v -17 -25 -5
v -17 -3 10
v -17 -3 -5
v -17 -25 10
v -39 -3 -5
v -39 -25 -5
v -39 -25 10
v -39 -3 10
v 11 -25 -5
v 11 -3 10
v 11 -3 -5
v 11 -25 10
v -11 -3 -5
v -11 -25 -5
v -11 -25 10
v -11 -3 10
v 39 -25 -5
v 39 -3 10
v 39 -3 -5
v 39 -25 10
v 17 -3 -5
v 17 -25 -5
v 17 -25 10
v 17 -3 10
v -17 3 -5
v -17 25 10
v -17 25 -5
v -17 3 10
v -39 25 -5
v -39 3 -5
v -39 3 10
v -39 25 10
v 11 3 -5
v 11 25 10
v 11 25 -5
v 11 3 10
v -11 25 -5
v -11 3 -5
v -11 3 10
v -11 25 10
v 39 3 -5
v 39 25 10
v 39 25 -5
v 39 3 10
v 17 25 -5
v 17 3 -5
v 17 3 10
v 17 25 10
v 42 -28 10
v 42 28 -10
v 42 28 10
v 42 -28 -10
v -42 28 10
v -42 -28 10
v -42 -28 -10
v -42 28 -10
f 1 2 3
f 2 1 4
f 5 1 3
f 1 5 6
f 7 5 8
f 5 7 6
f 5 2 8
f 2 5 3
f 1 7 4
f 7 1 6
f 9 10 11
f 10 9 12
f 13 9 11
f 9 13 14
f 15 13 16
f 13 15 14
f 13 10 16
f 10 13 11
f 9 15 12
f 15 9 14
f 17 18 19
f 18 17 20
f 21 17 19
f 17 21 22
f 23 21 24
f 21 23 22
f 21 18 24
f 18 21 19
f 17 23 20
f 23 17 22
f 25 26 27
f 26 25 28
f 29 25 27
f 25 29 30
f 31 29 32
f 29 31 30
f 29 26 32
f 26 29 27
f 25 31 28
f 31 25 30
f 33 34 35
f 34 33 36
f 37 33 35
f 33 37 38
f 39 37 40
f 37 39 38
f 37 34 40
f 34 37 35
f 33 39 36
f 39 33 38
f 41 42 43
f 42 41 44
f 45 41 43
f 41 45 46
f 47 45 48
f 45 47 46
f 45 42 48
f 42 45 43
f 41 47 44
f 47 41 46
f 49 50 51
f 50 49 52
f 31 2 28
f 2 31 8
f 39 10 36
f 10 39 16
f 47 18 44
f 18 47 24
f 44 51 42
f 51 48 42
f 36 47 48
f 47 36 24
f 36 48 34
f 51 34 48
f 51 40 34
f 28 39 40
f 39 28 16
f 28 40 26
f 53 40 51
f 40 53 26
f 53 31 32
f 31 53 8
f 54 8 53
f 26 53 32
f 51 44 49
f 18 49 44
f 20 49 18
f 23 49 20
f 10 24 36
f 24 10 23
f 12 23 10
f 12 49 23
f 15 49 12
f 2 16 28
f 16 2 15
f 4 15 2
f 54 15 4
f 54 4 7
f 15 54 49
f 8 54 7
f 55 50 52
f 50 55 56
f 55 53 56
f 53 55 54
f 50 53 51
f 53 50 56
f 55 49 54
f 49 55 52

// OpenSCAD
$fn = 32;

// ----------------------------------------------------------------------
// Pocket plate 84 x 56 x 20
// 2 x 3 pockets 22 mm square, 15 mm deep
// ----------------------------------------------------------------------

// --- parameters (mm) ---
thickness = 20;  // plate thickness
floor_t = 5;     // material left under each pocket
pocket = 22;     // pocket side length
pitch_x = 28;    // pocket pitch along X
pitch_y = 28;    // pocket pitch along Y
cols = 3;        // pockets per row
rows = 2;        // rows of pockets

// --- derived feature positions (mm) ---
depth = thickness - floor_t;        // = 15   pocket depth, down to the floor
span_x = (cols - 1) * pitch_x;      // = 56   distance between outer pockets
span_y = (rows - 1) * pitch_y;      // = 28   distance between outer pocket rows
origin_x = -span_x / 2;             // = -28   X of the first pocket
origin_y = -span_y / 2;             // = -14   Y of the first pocket
plate = [span_x + pocket + 6, span_y + pocket + 6, thickness];  // = [84, 56, 20]   overall size: pockets plus 3 mm of wall on each side
feature_centers = [
  [origin_x + 0 * pitch_x, origin_y + 0 * pitch_y],
  [origin_x + 1 * pitch_x, origin_y + 0 * pitch_y],
  [origin_x + 2 * pitch_x, origin_y + 0 * pitch_y],
  [origin_x + 0 * pitch_x, origin_y + 1 * pitch_y],
  [origin_x + 1 * pitch_x, origin_y + 1 * pitch_y],
  [origin_x + 2 * pitch_x, origin_y + 1 * pitch_y]
];   // pocket centres, used verbatim by the cutter loop

// plate outline, then one pocket per centre in feature_centers
difference() {
  cube(plate, center = true);
  for (centre = feature_centers)
    translate([centre[0] - pocket / 2, centre[1] - pocket / 2, plate[2] / 2 - depth])
      cube([pocket, pocket, depth + 1]);  // centred on the declared pocket centre
}
